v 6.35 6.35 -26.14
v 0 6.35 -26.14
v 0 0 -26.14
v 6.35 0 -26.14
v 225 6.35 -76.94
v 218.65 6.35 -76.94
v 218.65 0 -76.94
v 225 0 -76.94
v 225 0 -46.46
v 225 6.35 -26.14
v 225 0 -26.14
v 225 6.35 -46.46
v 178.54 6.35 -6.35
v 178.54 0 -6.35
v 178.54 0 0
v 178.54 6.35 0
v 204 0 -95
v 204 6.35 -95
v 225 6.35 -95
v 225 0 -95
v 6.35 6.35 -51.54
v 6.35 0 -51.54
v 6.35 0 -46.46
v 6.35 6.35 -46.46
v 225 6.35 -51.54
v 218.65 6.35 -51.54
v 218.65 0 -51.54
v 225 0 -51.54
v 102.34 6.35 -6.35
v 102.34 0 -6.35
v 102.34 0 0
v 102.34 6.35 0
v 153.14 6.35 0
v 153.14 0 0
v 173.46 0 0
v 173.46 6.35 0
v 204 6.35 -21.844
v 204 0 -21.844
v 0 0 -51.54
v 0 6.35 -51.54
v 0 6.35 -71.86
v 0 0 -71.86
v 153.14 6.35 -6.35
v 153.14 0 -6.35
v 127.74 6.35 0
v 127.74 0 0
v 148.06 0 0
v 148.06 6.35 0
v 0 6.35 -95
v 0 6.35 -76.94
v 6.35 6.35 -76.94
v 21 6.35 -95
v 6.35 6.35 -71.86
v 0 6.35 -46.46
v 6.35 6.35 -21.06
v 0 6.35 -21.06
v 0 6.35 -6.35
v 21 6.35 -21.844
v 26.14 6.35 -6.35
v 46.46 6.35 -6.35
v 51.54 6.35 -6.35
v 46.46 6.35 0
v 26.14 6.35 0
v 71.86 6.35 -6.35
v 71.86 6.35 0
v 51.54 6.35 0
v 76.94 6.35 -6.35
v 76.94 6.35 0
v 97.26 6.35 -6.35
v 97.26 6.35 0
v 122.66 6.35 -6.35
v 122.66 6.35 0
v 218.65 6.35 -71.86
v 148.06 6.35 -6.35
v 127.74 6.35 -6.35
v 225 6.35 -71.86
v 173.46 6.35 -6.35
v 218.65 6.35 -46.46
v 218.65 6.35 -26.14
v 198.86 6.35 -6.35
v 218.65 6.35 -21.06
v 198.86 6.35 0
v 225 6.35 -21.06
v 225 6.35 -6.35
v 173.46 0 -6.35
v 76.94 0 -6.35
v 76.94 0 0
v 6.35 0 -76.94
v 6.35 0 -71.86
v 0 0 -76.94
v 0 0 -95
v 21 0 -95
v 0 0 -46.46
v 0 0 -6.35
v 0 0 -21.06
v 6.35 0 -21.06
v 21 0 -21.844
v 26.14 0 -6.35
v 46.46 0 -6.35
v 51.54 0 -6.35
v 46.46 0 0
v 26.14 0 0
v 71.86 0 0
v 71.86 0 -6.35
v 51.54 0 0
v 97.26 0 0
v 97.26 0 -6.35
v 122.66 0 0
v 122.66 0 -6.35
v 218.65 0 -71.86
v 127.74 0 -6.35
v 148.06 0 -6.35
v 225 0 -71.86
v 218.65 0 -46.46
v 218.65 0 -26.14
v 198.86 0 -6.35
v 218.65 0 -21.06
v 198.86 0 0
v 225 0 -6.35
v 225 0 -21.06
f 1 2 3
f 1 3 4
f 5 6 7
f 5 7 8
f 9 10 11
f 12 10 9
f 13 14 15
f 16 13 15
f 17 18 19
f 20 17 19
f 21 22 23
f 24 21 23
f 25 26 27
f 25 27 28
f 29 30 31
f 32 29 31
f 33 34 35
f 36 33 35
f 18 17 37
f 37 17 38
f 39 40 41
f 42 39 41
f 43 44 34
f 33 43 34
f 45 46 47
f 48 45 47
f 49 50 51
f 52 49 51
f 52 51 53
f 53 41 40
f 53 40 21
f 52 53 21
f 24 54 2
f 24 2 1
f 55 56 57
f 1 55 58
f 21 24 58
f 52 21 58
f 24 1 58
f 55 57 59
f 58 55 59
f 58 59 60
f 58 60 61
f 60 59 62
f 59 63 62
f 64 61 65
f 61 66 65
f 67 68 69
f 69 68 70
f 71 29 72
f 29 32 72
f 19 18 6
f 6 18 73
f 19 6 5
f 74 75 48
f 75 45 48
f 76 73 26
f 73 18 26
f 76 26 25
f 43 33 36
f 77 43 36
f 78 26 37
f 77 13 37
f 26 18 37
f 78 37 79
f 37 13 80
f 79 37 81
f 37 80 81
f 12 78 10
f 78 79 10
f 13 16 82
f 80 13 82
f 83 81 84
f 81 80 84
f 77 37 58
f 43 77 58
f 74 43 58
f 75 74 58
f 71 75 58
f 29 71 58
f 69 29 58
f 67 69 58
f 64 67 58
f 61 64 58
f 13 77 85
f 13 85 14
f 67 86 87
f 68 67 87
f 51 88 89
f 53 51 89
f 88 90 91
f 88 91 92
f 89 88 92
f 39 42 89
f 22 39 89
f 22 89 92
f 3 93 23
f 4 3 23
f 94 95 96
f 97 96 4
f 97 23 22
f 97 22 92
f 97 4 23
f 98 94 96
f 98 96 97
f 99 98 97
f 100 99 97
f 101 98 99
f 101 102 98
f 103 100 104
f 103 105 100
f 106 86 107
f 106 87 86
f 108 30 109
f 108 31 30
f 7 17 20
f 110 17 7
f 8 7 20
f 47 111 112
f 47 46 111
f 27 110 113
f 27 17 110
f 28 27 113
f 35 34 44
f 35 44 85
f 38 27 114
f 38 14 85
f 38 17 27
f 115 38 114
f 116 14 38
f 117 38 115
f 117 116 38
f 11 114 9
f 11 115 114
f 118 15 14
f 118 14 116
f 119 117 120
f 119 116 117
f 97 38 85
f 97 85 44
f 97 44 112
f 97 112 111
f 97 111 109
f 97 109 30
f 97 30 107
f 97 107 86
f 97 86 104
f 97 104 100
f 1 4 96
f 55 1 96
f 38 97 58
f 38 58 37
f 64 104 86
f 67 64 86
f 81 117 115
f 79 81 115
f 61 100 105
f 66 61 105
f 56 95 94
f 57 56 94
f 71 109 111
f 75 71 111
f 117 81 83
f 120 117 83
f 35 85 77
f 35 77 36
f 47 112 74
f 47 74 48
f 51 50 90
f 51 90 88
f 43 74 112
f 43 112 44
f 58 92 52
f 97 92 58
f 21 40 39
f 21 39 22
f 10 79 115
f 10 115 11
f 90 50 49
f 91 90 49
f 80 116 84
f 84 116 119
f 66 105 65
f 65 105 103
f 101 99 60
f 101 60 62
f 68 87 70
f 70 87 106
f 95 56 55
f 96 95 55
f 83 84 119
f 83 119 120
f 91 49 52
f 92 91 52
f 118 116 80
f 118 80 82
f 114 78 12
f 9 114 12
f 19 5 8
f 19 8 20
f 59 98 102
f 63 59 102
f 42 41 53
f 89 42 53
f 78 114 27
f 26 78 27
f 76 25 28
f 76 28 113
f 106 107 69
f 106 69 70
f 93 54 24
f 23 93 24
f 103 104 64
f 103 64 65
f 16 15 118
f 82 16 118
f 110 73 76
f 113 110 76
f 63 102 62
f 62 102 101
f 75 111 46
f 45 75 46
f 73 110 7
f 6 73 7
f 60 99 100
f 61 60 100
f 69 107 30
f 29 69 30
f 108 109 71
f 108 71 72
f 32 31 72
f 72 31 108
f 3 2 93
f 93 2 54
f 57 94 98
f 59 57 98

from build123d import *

# Parameters (mm, degrees)
SKETCH1_W           = 32.142857143
SKETCH1_H           = 6.35
SKETCH1_W_2         = 32.142857142
BOSS_EXTRUDE1_DEPTH = 6.35
SKETCH2_W           = 212.3
SKETCH2_H           = 112.5
CUT_EXTRUDE1_DEPTH  = 314.804310041
SKETCH3_W           = 212.3
SKETCH3_H           = 17.5
CUT_EXTRUDE2_DEPTH  = 6.35
SKETCH4_W           = 6.35
SKETCH4_H           = 18.05999894
SKETCH4_H_2         = 20.32
SKETCH4_H_3         = 14.71000106
BOSS_EXTRUDE2_DEPTH = 6.35
SKETCH5_W           = 183
SKETCH5_H           = 73.156
CUT_EXTRUDE3_DEPTH  = 245.316029969
SKETCH6_W           = 225
SKETCH6_H           = 6.35
BOSS_EXTRUDE3_DEPTH = 6.35
SKETCH7_W           = 5.08
SKETCH7_H           = 6.35
SKETCH7_W_2         = 26.14
CUT_EXTRUDE4_DEPTH  = 245.316029969


with BuildPart() as part:
    # Sketch1 → Boss-Extrude1 (new body)
    with BuildSketch(Plane(origin=(0, 0, 0), x_dir=(1, 0, 0), z_dir=(0, 1, 0))):
        Polygon((6.35, 6.35), (32.142857143, 6.35), (64.285714286, 6.35), (96.428571429, 6.35), (128.571428571, 6.35), (160.714285714, 6.35), (192.857142857, 6.35), (218.65, 6.35), (218.65, 32.142857143), (218.65, 64.285714286), (218.65, 96.428571429), (218.65, 128.571428571), (218.65, 160.714285714), (218.65, 192.857142857), (218.65, 218.65), (192.857142857, 218.65), (160.714285714, 218.65), (128.571428571, 218.65), (96.428571429, 218.65), (64.285714286, 218.65), (32.142857143, 218.65), (6.35, 218.65), (6.35, 192.857142857), (6.35, 160.714285714), (6.35, 128.571428571), (6.35, 96.428571429), (6.35, 64.285714286), (6.35, 32.142857143), align=None)
        with Locations((48.214285715, 221.825)):
            Rectangle(SKETCH1_W, SKETCH1_H)
        with Locations((112.5, 221.825)):
            Rectangle(SKETCH1_W_2, SKETCH1_H)
        with Locations((176.785714286, 221.825)):
            Rectangle(SKETCH1_W, SKETCH1_H)
        with Locations((176.785714286, 3.175)):
            Rectangle(SKETCH1_W, SKETCH1_H)
        with Locations((112.5, 3.175)):
            Rectangle(SKETCH1_W_2, SKETCH1_H)
        with Locations((48.214285715, 3.175)):
            Rectangle(SKETCH1_W, SKETCH1_H)
    extrude(amount=BOSS_EXTRUDE1_DEPTH)

    # Sketch2 → Cut-Extrude1 (cut, through all)
    with BuildSketch(Plane(origin=(0, 6.35, 0), x_dir=(1, 0, 0), z_dir=(0, 1, 0))):
        with Locations((112.5, 168.75)):
            Rectangle(SKETCH2_W, SKETCH2_H)
    extrude(amount=-CUT_EXTRUDE1_DEPTH, mode=Mode.SUBTRACT)

    # Sketch3 → Cut-Extrude2 (cut)
    with BuildSketch(Plane(origin=(0, 6.35, 0), x_dir=(1, 0, 0), z_dir=(0, 1, 0))):
        with Locations((112.5, 103.75)):
            Rectangle(SKETCH3_W, SKETCH3_H)
    extrude(amount=-CUT_EXTRUDE2_DEPTH, mode=Mode.SUBTRACT)

    # Sketch4 → Boss-Extrude2 (add)
    with BuildSketch(Plane(origin=(0, 6.35, 0), x_dir=(1, 0, 0), z_dir=(0, 1, 0))):
        with Locations((3.175, 85.97000053)):
            Rectangle(SKETCH4_W, SKETCH4_H)
        with Locations((3.175, 61.70000106)):
            Rectangle(SKETCH4_W, SKETCH4_H_2)
        with Locations((3.175, 36.30000106)):
            Rectangle(SKETCH4_W, SKETCH4_H_2)
        with Locations((3.175, 13.70500053)):
            Rectangle(SKETCH4_W, SKETCH4_H_3)
        with Locations((221.825, 85.97000053)):
            Rectangle(SKETCH4_W, SKETCH4_H)
        with Locations((221.825, 61.70000106)):
            Rectangle(SKETCH4_W, SKETCH4_H_2)
        with Locations((221.825, 36.30000106)):
            Rectangle(SKETCH4_W, SKETCH4_H_2)
        with Locations((221.825, 13.70500053)):
            Rectangle(SKETCH4_W, SKETCH4_H_3)
    extrude(amount=-BOSS_EXTRUDE2_DEPTH)

    # Sketch5 → Cut-Extrude3 (cut, through all)
    with BuildSketch(Plane.XZ):
        with Locations((112.5, -58.422)):
            Rectangle(SKETCH5_W, SKETCH5_H)
    extrude(amount=-CUT_EXTRUDE3_DEPTH, mode=Mode.SUBTRACT)

    # Sketch6 → Boss-Extrude3 (add)
    with BuildSketch(Plane.XZ):
        with Locations((112.5, -3.175)):
            Rectangle(SKETCH6_W, SKETCH6_H)
    extrude(amount=-BOSS_EXTRUDE3_DEPTH)

    # Sketch7 → Cut-Extrude4 (cut, through all)
    with BuildSketch(Plane.XZ):
        with Locations((176, -3.175)):
            Rectangle(SKETCH7_W, SKETCH7_H)
        with Locations((150.6, -3.175)):
            Rectangle(SKETCH7_W, SKETCH7_H)
        with Locations((125.2, -3.175)):
            Rectangle(SKETCH7_W, SKETCH7_H)
        with Locations((99.8, -3.175)):
            Rectangle(SKETCH7_W, SKETCH7_H)
        with Locations((74.4, -3.175)):
            Rectangle(SKETCH7_W, SKETCH7_H)
        with Locations((49, -3.175)):
            Rectangle(SKETCH7_W, SKETCH7_H)
        with Locations((211.93, -3.175)):
            Rectangle(SKETCH7_W_2, SKETCH7_H)
        with Locations((13.07, -3.175)):
            Rectangle(SKETCH7_W_2, SKETCH7_H)
    extrude(amount=-CUT_EXTRUDE4_DEPTH, mode=Mode.SUBTRACT)


solid = part.part
